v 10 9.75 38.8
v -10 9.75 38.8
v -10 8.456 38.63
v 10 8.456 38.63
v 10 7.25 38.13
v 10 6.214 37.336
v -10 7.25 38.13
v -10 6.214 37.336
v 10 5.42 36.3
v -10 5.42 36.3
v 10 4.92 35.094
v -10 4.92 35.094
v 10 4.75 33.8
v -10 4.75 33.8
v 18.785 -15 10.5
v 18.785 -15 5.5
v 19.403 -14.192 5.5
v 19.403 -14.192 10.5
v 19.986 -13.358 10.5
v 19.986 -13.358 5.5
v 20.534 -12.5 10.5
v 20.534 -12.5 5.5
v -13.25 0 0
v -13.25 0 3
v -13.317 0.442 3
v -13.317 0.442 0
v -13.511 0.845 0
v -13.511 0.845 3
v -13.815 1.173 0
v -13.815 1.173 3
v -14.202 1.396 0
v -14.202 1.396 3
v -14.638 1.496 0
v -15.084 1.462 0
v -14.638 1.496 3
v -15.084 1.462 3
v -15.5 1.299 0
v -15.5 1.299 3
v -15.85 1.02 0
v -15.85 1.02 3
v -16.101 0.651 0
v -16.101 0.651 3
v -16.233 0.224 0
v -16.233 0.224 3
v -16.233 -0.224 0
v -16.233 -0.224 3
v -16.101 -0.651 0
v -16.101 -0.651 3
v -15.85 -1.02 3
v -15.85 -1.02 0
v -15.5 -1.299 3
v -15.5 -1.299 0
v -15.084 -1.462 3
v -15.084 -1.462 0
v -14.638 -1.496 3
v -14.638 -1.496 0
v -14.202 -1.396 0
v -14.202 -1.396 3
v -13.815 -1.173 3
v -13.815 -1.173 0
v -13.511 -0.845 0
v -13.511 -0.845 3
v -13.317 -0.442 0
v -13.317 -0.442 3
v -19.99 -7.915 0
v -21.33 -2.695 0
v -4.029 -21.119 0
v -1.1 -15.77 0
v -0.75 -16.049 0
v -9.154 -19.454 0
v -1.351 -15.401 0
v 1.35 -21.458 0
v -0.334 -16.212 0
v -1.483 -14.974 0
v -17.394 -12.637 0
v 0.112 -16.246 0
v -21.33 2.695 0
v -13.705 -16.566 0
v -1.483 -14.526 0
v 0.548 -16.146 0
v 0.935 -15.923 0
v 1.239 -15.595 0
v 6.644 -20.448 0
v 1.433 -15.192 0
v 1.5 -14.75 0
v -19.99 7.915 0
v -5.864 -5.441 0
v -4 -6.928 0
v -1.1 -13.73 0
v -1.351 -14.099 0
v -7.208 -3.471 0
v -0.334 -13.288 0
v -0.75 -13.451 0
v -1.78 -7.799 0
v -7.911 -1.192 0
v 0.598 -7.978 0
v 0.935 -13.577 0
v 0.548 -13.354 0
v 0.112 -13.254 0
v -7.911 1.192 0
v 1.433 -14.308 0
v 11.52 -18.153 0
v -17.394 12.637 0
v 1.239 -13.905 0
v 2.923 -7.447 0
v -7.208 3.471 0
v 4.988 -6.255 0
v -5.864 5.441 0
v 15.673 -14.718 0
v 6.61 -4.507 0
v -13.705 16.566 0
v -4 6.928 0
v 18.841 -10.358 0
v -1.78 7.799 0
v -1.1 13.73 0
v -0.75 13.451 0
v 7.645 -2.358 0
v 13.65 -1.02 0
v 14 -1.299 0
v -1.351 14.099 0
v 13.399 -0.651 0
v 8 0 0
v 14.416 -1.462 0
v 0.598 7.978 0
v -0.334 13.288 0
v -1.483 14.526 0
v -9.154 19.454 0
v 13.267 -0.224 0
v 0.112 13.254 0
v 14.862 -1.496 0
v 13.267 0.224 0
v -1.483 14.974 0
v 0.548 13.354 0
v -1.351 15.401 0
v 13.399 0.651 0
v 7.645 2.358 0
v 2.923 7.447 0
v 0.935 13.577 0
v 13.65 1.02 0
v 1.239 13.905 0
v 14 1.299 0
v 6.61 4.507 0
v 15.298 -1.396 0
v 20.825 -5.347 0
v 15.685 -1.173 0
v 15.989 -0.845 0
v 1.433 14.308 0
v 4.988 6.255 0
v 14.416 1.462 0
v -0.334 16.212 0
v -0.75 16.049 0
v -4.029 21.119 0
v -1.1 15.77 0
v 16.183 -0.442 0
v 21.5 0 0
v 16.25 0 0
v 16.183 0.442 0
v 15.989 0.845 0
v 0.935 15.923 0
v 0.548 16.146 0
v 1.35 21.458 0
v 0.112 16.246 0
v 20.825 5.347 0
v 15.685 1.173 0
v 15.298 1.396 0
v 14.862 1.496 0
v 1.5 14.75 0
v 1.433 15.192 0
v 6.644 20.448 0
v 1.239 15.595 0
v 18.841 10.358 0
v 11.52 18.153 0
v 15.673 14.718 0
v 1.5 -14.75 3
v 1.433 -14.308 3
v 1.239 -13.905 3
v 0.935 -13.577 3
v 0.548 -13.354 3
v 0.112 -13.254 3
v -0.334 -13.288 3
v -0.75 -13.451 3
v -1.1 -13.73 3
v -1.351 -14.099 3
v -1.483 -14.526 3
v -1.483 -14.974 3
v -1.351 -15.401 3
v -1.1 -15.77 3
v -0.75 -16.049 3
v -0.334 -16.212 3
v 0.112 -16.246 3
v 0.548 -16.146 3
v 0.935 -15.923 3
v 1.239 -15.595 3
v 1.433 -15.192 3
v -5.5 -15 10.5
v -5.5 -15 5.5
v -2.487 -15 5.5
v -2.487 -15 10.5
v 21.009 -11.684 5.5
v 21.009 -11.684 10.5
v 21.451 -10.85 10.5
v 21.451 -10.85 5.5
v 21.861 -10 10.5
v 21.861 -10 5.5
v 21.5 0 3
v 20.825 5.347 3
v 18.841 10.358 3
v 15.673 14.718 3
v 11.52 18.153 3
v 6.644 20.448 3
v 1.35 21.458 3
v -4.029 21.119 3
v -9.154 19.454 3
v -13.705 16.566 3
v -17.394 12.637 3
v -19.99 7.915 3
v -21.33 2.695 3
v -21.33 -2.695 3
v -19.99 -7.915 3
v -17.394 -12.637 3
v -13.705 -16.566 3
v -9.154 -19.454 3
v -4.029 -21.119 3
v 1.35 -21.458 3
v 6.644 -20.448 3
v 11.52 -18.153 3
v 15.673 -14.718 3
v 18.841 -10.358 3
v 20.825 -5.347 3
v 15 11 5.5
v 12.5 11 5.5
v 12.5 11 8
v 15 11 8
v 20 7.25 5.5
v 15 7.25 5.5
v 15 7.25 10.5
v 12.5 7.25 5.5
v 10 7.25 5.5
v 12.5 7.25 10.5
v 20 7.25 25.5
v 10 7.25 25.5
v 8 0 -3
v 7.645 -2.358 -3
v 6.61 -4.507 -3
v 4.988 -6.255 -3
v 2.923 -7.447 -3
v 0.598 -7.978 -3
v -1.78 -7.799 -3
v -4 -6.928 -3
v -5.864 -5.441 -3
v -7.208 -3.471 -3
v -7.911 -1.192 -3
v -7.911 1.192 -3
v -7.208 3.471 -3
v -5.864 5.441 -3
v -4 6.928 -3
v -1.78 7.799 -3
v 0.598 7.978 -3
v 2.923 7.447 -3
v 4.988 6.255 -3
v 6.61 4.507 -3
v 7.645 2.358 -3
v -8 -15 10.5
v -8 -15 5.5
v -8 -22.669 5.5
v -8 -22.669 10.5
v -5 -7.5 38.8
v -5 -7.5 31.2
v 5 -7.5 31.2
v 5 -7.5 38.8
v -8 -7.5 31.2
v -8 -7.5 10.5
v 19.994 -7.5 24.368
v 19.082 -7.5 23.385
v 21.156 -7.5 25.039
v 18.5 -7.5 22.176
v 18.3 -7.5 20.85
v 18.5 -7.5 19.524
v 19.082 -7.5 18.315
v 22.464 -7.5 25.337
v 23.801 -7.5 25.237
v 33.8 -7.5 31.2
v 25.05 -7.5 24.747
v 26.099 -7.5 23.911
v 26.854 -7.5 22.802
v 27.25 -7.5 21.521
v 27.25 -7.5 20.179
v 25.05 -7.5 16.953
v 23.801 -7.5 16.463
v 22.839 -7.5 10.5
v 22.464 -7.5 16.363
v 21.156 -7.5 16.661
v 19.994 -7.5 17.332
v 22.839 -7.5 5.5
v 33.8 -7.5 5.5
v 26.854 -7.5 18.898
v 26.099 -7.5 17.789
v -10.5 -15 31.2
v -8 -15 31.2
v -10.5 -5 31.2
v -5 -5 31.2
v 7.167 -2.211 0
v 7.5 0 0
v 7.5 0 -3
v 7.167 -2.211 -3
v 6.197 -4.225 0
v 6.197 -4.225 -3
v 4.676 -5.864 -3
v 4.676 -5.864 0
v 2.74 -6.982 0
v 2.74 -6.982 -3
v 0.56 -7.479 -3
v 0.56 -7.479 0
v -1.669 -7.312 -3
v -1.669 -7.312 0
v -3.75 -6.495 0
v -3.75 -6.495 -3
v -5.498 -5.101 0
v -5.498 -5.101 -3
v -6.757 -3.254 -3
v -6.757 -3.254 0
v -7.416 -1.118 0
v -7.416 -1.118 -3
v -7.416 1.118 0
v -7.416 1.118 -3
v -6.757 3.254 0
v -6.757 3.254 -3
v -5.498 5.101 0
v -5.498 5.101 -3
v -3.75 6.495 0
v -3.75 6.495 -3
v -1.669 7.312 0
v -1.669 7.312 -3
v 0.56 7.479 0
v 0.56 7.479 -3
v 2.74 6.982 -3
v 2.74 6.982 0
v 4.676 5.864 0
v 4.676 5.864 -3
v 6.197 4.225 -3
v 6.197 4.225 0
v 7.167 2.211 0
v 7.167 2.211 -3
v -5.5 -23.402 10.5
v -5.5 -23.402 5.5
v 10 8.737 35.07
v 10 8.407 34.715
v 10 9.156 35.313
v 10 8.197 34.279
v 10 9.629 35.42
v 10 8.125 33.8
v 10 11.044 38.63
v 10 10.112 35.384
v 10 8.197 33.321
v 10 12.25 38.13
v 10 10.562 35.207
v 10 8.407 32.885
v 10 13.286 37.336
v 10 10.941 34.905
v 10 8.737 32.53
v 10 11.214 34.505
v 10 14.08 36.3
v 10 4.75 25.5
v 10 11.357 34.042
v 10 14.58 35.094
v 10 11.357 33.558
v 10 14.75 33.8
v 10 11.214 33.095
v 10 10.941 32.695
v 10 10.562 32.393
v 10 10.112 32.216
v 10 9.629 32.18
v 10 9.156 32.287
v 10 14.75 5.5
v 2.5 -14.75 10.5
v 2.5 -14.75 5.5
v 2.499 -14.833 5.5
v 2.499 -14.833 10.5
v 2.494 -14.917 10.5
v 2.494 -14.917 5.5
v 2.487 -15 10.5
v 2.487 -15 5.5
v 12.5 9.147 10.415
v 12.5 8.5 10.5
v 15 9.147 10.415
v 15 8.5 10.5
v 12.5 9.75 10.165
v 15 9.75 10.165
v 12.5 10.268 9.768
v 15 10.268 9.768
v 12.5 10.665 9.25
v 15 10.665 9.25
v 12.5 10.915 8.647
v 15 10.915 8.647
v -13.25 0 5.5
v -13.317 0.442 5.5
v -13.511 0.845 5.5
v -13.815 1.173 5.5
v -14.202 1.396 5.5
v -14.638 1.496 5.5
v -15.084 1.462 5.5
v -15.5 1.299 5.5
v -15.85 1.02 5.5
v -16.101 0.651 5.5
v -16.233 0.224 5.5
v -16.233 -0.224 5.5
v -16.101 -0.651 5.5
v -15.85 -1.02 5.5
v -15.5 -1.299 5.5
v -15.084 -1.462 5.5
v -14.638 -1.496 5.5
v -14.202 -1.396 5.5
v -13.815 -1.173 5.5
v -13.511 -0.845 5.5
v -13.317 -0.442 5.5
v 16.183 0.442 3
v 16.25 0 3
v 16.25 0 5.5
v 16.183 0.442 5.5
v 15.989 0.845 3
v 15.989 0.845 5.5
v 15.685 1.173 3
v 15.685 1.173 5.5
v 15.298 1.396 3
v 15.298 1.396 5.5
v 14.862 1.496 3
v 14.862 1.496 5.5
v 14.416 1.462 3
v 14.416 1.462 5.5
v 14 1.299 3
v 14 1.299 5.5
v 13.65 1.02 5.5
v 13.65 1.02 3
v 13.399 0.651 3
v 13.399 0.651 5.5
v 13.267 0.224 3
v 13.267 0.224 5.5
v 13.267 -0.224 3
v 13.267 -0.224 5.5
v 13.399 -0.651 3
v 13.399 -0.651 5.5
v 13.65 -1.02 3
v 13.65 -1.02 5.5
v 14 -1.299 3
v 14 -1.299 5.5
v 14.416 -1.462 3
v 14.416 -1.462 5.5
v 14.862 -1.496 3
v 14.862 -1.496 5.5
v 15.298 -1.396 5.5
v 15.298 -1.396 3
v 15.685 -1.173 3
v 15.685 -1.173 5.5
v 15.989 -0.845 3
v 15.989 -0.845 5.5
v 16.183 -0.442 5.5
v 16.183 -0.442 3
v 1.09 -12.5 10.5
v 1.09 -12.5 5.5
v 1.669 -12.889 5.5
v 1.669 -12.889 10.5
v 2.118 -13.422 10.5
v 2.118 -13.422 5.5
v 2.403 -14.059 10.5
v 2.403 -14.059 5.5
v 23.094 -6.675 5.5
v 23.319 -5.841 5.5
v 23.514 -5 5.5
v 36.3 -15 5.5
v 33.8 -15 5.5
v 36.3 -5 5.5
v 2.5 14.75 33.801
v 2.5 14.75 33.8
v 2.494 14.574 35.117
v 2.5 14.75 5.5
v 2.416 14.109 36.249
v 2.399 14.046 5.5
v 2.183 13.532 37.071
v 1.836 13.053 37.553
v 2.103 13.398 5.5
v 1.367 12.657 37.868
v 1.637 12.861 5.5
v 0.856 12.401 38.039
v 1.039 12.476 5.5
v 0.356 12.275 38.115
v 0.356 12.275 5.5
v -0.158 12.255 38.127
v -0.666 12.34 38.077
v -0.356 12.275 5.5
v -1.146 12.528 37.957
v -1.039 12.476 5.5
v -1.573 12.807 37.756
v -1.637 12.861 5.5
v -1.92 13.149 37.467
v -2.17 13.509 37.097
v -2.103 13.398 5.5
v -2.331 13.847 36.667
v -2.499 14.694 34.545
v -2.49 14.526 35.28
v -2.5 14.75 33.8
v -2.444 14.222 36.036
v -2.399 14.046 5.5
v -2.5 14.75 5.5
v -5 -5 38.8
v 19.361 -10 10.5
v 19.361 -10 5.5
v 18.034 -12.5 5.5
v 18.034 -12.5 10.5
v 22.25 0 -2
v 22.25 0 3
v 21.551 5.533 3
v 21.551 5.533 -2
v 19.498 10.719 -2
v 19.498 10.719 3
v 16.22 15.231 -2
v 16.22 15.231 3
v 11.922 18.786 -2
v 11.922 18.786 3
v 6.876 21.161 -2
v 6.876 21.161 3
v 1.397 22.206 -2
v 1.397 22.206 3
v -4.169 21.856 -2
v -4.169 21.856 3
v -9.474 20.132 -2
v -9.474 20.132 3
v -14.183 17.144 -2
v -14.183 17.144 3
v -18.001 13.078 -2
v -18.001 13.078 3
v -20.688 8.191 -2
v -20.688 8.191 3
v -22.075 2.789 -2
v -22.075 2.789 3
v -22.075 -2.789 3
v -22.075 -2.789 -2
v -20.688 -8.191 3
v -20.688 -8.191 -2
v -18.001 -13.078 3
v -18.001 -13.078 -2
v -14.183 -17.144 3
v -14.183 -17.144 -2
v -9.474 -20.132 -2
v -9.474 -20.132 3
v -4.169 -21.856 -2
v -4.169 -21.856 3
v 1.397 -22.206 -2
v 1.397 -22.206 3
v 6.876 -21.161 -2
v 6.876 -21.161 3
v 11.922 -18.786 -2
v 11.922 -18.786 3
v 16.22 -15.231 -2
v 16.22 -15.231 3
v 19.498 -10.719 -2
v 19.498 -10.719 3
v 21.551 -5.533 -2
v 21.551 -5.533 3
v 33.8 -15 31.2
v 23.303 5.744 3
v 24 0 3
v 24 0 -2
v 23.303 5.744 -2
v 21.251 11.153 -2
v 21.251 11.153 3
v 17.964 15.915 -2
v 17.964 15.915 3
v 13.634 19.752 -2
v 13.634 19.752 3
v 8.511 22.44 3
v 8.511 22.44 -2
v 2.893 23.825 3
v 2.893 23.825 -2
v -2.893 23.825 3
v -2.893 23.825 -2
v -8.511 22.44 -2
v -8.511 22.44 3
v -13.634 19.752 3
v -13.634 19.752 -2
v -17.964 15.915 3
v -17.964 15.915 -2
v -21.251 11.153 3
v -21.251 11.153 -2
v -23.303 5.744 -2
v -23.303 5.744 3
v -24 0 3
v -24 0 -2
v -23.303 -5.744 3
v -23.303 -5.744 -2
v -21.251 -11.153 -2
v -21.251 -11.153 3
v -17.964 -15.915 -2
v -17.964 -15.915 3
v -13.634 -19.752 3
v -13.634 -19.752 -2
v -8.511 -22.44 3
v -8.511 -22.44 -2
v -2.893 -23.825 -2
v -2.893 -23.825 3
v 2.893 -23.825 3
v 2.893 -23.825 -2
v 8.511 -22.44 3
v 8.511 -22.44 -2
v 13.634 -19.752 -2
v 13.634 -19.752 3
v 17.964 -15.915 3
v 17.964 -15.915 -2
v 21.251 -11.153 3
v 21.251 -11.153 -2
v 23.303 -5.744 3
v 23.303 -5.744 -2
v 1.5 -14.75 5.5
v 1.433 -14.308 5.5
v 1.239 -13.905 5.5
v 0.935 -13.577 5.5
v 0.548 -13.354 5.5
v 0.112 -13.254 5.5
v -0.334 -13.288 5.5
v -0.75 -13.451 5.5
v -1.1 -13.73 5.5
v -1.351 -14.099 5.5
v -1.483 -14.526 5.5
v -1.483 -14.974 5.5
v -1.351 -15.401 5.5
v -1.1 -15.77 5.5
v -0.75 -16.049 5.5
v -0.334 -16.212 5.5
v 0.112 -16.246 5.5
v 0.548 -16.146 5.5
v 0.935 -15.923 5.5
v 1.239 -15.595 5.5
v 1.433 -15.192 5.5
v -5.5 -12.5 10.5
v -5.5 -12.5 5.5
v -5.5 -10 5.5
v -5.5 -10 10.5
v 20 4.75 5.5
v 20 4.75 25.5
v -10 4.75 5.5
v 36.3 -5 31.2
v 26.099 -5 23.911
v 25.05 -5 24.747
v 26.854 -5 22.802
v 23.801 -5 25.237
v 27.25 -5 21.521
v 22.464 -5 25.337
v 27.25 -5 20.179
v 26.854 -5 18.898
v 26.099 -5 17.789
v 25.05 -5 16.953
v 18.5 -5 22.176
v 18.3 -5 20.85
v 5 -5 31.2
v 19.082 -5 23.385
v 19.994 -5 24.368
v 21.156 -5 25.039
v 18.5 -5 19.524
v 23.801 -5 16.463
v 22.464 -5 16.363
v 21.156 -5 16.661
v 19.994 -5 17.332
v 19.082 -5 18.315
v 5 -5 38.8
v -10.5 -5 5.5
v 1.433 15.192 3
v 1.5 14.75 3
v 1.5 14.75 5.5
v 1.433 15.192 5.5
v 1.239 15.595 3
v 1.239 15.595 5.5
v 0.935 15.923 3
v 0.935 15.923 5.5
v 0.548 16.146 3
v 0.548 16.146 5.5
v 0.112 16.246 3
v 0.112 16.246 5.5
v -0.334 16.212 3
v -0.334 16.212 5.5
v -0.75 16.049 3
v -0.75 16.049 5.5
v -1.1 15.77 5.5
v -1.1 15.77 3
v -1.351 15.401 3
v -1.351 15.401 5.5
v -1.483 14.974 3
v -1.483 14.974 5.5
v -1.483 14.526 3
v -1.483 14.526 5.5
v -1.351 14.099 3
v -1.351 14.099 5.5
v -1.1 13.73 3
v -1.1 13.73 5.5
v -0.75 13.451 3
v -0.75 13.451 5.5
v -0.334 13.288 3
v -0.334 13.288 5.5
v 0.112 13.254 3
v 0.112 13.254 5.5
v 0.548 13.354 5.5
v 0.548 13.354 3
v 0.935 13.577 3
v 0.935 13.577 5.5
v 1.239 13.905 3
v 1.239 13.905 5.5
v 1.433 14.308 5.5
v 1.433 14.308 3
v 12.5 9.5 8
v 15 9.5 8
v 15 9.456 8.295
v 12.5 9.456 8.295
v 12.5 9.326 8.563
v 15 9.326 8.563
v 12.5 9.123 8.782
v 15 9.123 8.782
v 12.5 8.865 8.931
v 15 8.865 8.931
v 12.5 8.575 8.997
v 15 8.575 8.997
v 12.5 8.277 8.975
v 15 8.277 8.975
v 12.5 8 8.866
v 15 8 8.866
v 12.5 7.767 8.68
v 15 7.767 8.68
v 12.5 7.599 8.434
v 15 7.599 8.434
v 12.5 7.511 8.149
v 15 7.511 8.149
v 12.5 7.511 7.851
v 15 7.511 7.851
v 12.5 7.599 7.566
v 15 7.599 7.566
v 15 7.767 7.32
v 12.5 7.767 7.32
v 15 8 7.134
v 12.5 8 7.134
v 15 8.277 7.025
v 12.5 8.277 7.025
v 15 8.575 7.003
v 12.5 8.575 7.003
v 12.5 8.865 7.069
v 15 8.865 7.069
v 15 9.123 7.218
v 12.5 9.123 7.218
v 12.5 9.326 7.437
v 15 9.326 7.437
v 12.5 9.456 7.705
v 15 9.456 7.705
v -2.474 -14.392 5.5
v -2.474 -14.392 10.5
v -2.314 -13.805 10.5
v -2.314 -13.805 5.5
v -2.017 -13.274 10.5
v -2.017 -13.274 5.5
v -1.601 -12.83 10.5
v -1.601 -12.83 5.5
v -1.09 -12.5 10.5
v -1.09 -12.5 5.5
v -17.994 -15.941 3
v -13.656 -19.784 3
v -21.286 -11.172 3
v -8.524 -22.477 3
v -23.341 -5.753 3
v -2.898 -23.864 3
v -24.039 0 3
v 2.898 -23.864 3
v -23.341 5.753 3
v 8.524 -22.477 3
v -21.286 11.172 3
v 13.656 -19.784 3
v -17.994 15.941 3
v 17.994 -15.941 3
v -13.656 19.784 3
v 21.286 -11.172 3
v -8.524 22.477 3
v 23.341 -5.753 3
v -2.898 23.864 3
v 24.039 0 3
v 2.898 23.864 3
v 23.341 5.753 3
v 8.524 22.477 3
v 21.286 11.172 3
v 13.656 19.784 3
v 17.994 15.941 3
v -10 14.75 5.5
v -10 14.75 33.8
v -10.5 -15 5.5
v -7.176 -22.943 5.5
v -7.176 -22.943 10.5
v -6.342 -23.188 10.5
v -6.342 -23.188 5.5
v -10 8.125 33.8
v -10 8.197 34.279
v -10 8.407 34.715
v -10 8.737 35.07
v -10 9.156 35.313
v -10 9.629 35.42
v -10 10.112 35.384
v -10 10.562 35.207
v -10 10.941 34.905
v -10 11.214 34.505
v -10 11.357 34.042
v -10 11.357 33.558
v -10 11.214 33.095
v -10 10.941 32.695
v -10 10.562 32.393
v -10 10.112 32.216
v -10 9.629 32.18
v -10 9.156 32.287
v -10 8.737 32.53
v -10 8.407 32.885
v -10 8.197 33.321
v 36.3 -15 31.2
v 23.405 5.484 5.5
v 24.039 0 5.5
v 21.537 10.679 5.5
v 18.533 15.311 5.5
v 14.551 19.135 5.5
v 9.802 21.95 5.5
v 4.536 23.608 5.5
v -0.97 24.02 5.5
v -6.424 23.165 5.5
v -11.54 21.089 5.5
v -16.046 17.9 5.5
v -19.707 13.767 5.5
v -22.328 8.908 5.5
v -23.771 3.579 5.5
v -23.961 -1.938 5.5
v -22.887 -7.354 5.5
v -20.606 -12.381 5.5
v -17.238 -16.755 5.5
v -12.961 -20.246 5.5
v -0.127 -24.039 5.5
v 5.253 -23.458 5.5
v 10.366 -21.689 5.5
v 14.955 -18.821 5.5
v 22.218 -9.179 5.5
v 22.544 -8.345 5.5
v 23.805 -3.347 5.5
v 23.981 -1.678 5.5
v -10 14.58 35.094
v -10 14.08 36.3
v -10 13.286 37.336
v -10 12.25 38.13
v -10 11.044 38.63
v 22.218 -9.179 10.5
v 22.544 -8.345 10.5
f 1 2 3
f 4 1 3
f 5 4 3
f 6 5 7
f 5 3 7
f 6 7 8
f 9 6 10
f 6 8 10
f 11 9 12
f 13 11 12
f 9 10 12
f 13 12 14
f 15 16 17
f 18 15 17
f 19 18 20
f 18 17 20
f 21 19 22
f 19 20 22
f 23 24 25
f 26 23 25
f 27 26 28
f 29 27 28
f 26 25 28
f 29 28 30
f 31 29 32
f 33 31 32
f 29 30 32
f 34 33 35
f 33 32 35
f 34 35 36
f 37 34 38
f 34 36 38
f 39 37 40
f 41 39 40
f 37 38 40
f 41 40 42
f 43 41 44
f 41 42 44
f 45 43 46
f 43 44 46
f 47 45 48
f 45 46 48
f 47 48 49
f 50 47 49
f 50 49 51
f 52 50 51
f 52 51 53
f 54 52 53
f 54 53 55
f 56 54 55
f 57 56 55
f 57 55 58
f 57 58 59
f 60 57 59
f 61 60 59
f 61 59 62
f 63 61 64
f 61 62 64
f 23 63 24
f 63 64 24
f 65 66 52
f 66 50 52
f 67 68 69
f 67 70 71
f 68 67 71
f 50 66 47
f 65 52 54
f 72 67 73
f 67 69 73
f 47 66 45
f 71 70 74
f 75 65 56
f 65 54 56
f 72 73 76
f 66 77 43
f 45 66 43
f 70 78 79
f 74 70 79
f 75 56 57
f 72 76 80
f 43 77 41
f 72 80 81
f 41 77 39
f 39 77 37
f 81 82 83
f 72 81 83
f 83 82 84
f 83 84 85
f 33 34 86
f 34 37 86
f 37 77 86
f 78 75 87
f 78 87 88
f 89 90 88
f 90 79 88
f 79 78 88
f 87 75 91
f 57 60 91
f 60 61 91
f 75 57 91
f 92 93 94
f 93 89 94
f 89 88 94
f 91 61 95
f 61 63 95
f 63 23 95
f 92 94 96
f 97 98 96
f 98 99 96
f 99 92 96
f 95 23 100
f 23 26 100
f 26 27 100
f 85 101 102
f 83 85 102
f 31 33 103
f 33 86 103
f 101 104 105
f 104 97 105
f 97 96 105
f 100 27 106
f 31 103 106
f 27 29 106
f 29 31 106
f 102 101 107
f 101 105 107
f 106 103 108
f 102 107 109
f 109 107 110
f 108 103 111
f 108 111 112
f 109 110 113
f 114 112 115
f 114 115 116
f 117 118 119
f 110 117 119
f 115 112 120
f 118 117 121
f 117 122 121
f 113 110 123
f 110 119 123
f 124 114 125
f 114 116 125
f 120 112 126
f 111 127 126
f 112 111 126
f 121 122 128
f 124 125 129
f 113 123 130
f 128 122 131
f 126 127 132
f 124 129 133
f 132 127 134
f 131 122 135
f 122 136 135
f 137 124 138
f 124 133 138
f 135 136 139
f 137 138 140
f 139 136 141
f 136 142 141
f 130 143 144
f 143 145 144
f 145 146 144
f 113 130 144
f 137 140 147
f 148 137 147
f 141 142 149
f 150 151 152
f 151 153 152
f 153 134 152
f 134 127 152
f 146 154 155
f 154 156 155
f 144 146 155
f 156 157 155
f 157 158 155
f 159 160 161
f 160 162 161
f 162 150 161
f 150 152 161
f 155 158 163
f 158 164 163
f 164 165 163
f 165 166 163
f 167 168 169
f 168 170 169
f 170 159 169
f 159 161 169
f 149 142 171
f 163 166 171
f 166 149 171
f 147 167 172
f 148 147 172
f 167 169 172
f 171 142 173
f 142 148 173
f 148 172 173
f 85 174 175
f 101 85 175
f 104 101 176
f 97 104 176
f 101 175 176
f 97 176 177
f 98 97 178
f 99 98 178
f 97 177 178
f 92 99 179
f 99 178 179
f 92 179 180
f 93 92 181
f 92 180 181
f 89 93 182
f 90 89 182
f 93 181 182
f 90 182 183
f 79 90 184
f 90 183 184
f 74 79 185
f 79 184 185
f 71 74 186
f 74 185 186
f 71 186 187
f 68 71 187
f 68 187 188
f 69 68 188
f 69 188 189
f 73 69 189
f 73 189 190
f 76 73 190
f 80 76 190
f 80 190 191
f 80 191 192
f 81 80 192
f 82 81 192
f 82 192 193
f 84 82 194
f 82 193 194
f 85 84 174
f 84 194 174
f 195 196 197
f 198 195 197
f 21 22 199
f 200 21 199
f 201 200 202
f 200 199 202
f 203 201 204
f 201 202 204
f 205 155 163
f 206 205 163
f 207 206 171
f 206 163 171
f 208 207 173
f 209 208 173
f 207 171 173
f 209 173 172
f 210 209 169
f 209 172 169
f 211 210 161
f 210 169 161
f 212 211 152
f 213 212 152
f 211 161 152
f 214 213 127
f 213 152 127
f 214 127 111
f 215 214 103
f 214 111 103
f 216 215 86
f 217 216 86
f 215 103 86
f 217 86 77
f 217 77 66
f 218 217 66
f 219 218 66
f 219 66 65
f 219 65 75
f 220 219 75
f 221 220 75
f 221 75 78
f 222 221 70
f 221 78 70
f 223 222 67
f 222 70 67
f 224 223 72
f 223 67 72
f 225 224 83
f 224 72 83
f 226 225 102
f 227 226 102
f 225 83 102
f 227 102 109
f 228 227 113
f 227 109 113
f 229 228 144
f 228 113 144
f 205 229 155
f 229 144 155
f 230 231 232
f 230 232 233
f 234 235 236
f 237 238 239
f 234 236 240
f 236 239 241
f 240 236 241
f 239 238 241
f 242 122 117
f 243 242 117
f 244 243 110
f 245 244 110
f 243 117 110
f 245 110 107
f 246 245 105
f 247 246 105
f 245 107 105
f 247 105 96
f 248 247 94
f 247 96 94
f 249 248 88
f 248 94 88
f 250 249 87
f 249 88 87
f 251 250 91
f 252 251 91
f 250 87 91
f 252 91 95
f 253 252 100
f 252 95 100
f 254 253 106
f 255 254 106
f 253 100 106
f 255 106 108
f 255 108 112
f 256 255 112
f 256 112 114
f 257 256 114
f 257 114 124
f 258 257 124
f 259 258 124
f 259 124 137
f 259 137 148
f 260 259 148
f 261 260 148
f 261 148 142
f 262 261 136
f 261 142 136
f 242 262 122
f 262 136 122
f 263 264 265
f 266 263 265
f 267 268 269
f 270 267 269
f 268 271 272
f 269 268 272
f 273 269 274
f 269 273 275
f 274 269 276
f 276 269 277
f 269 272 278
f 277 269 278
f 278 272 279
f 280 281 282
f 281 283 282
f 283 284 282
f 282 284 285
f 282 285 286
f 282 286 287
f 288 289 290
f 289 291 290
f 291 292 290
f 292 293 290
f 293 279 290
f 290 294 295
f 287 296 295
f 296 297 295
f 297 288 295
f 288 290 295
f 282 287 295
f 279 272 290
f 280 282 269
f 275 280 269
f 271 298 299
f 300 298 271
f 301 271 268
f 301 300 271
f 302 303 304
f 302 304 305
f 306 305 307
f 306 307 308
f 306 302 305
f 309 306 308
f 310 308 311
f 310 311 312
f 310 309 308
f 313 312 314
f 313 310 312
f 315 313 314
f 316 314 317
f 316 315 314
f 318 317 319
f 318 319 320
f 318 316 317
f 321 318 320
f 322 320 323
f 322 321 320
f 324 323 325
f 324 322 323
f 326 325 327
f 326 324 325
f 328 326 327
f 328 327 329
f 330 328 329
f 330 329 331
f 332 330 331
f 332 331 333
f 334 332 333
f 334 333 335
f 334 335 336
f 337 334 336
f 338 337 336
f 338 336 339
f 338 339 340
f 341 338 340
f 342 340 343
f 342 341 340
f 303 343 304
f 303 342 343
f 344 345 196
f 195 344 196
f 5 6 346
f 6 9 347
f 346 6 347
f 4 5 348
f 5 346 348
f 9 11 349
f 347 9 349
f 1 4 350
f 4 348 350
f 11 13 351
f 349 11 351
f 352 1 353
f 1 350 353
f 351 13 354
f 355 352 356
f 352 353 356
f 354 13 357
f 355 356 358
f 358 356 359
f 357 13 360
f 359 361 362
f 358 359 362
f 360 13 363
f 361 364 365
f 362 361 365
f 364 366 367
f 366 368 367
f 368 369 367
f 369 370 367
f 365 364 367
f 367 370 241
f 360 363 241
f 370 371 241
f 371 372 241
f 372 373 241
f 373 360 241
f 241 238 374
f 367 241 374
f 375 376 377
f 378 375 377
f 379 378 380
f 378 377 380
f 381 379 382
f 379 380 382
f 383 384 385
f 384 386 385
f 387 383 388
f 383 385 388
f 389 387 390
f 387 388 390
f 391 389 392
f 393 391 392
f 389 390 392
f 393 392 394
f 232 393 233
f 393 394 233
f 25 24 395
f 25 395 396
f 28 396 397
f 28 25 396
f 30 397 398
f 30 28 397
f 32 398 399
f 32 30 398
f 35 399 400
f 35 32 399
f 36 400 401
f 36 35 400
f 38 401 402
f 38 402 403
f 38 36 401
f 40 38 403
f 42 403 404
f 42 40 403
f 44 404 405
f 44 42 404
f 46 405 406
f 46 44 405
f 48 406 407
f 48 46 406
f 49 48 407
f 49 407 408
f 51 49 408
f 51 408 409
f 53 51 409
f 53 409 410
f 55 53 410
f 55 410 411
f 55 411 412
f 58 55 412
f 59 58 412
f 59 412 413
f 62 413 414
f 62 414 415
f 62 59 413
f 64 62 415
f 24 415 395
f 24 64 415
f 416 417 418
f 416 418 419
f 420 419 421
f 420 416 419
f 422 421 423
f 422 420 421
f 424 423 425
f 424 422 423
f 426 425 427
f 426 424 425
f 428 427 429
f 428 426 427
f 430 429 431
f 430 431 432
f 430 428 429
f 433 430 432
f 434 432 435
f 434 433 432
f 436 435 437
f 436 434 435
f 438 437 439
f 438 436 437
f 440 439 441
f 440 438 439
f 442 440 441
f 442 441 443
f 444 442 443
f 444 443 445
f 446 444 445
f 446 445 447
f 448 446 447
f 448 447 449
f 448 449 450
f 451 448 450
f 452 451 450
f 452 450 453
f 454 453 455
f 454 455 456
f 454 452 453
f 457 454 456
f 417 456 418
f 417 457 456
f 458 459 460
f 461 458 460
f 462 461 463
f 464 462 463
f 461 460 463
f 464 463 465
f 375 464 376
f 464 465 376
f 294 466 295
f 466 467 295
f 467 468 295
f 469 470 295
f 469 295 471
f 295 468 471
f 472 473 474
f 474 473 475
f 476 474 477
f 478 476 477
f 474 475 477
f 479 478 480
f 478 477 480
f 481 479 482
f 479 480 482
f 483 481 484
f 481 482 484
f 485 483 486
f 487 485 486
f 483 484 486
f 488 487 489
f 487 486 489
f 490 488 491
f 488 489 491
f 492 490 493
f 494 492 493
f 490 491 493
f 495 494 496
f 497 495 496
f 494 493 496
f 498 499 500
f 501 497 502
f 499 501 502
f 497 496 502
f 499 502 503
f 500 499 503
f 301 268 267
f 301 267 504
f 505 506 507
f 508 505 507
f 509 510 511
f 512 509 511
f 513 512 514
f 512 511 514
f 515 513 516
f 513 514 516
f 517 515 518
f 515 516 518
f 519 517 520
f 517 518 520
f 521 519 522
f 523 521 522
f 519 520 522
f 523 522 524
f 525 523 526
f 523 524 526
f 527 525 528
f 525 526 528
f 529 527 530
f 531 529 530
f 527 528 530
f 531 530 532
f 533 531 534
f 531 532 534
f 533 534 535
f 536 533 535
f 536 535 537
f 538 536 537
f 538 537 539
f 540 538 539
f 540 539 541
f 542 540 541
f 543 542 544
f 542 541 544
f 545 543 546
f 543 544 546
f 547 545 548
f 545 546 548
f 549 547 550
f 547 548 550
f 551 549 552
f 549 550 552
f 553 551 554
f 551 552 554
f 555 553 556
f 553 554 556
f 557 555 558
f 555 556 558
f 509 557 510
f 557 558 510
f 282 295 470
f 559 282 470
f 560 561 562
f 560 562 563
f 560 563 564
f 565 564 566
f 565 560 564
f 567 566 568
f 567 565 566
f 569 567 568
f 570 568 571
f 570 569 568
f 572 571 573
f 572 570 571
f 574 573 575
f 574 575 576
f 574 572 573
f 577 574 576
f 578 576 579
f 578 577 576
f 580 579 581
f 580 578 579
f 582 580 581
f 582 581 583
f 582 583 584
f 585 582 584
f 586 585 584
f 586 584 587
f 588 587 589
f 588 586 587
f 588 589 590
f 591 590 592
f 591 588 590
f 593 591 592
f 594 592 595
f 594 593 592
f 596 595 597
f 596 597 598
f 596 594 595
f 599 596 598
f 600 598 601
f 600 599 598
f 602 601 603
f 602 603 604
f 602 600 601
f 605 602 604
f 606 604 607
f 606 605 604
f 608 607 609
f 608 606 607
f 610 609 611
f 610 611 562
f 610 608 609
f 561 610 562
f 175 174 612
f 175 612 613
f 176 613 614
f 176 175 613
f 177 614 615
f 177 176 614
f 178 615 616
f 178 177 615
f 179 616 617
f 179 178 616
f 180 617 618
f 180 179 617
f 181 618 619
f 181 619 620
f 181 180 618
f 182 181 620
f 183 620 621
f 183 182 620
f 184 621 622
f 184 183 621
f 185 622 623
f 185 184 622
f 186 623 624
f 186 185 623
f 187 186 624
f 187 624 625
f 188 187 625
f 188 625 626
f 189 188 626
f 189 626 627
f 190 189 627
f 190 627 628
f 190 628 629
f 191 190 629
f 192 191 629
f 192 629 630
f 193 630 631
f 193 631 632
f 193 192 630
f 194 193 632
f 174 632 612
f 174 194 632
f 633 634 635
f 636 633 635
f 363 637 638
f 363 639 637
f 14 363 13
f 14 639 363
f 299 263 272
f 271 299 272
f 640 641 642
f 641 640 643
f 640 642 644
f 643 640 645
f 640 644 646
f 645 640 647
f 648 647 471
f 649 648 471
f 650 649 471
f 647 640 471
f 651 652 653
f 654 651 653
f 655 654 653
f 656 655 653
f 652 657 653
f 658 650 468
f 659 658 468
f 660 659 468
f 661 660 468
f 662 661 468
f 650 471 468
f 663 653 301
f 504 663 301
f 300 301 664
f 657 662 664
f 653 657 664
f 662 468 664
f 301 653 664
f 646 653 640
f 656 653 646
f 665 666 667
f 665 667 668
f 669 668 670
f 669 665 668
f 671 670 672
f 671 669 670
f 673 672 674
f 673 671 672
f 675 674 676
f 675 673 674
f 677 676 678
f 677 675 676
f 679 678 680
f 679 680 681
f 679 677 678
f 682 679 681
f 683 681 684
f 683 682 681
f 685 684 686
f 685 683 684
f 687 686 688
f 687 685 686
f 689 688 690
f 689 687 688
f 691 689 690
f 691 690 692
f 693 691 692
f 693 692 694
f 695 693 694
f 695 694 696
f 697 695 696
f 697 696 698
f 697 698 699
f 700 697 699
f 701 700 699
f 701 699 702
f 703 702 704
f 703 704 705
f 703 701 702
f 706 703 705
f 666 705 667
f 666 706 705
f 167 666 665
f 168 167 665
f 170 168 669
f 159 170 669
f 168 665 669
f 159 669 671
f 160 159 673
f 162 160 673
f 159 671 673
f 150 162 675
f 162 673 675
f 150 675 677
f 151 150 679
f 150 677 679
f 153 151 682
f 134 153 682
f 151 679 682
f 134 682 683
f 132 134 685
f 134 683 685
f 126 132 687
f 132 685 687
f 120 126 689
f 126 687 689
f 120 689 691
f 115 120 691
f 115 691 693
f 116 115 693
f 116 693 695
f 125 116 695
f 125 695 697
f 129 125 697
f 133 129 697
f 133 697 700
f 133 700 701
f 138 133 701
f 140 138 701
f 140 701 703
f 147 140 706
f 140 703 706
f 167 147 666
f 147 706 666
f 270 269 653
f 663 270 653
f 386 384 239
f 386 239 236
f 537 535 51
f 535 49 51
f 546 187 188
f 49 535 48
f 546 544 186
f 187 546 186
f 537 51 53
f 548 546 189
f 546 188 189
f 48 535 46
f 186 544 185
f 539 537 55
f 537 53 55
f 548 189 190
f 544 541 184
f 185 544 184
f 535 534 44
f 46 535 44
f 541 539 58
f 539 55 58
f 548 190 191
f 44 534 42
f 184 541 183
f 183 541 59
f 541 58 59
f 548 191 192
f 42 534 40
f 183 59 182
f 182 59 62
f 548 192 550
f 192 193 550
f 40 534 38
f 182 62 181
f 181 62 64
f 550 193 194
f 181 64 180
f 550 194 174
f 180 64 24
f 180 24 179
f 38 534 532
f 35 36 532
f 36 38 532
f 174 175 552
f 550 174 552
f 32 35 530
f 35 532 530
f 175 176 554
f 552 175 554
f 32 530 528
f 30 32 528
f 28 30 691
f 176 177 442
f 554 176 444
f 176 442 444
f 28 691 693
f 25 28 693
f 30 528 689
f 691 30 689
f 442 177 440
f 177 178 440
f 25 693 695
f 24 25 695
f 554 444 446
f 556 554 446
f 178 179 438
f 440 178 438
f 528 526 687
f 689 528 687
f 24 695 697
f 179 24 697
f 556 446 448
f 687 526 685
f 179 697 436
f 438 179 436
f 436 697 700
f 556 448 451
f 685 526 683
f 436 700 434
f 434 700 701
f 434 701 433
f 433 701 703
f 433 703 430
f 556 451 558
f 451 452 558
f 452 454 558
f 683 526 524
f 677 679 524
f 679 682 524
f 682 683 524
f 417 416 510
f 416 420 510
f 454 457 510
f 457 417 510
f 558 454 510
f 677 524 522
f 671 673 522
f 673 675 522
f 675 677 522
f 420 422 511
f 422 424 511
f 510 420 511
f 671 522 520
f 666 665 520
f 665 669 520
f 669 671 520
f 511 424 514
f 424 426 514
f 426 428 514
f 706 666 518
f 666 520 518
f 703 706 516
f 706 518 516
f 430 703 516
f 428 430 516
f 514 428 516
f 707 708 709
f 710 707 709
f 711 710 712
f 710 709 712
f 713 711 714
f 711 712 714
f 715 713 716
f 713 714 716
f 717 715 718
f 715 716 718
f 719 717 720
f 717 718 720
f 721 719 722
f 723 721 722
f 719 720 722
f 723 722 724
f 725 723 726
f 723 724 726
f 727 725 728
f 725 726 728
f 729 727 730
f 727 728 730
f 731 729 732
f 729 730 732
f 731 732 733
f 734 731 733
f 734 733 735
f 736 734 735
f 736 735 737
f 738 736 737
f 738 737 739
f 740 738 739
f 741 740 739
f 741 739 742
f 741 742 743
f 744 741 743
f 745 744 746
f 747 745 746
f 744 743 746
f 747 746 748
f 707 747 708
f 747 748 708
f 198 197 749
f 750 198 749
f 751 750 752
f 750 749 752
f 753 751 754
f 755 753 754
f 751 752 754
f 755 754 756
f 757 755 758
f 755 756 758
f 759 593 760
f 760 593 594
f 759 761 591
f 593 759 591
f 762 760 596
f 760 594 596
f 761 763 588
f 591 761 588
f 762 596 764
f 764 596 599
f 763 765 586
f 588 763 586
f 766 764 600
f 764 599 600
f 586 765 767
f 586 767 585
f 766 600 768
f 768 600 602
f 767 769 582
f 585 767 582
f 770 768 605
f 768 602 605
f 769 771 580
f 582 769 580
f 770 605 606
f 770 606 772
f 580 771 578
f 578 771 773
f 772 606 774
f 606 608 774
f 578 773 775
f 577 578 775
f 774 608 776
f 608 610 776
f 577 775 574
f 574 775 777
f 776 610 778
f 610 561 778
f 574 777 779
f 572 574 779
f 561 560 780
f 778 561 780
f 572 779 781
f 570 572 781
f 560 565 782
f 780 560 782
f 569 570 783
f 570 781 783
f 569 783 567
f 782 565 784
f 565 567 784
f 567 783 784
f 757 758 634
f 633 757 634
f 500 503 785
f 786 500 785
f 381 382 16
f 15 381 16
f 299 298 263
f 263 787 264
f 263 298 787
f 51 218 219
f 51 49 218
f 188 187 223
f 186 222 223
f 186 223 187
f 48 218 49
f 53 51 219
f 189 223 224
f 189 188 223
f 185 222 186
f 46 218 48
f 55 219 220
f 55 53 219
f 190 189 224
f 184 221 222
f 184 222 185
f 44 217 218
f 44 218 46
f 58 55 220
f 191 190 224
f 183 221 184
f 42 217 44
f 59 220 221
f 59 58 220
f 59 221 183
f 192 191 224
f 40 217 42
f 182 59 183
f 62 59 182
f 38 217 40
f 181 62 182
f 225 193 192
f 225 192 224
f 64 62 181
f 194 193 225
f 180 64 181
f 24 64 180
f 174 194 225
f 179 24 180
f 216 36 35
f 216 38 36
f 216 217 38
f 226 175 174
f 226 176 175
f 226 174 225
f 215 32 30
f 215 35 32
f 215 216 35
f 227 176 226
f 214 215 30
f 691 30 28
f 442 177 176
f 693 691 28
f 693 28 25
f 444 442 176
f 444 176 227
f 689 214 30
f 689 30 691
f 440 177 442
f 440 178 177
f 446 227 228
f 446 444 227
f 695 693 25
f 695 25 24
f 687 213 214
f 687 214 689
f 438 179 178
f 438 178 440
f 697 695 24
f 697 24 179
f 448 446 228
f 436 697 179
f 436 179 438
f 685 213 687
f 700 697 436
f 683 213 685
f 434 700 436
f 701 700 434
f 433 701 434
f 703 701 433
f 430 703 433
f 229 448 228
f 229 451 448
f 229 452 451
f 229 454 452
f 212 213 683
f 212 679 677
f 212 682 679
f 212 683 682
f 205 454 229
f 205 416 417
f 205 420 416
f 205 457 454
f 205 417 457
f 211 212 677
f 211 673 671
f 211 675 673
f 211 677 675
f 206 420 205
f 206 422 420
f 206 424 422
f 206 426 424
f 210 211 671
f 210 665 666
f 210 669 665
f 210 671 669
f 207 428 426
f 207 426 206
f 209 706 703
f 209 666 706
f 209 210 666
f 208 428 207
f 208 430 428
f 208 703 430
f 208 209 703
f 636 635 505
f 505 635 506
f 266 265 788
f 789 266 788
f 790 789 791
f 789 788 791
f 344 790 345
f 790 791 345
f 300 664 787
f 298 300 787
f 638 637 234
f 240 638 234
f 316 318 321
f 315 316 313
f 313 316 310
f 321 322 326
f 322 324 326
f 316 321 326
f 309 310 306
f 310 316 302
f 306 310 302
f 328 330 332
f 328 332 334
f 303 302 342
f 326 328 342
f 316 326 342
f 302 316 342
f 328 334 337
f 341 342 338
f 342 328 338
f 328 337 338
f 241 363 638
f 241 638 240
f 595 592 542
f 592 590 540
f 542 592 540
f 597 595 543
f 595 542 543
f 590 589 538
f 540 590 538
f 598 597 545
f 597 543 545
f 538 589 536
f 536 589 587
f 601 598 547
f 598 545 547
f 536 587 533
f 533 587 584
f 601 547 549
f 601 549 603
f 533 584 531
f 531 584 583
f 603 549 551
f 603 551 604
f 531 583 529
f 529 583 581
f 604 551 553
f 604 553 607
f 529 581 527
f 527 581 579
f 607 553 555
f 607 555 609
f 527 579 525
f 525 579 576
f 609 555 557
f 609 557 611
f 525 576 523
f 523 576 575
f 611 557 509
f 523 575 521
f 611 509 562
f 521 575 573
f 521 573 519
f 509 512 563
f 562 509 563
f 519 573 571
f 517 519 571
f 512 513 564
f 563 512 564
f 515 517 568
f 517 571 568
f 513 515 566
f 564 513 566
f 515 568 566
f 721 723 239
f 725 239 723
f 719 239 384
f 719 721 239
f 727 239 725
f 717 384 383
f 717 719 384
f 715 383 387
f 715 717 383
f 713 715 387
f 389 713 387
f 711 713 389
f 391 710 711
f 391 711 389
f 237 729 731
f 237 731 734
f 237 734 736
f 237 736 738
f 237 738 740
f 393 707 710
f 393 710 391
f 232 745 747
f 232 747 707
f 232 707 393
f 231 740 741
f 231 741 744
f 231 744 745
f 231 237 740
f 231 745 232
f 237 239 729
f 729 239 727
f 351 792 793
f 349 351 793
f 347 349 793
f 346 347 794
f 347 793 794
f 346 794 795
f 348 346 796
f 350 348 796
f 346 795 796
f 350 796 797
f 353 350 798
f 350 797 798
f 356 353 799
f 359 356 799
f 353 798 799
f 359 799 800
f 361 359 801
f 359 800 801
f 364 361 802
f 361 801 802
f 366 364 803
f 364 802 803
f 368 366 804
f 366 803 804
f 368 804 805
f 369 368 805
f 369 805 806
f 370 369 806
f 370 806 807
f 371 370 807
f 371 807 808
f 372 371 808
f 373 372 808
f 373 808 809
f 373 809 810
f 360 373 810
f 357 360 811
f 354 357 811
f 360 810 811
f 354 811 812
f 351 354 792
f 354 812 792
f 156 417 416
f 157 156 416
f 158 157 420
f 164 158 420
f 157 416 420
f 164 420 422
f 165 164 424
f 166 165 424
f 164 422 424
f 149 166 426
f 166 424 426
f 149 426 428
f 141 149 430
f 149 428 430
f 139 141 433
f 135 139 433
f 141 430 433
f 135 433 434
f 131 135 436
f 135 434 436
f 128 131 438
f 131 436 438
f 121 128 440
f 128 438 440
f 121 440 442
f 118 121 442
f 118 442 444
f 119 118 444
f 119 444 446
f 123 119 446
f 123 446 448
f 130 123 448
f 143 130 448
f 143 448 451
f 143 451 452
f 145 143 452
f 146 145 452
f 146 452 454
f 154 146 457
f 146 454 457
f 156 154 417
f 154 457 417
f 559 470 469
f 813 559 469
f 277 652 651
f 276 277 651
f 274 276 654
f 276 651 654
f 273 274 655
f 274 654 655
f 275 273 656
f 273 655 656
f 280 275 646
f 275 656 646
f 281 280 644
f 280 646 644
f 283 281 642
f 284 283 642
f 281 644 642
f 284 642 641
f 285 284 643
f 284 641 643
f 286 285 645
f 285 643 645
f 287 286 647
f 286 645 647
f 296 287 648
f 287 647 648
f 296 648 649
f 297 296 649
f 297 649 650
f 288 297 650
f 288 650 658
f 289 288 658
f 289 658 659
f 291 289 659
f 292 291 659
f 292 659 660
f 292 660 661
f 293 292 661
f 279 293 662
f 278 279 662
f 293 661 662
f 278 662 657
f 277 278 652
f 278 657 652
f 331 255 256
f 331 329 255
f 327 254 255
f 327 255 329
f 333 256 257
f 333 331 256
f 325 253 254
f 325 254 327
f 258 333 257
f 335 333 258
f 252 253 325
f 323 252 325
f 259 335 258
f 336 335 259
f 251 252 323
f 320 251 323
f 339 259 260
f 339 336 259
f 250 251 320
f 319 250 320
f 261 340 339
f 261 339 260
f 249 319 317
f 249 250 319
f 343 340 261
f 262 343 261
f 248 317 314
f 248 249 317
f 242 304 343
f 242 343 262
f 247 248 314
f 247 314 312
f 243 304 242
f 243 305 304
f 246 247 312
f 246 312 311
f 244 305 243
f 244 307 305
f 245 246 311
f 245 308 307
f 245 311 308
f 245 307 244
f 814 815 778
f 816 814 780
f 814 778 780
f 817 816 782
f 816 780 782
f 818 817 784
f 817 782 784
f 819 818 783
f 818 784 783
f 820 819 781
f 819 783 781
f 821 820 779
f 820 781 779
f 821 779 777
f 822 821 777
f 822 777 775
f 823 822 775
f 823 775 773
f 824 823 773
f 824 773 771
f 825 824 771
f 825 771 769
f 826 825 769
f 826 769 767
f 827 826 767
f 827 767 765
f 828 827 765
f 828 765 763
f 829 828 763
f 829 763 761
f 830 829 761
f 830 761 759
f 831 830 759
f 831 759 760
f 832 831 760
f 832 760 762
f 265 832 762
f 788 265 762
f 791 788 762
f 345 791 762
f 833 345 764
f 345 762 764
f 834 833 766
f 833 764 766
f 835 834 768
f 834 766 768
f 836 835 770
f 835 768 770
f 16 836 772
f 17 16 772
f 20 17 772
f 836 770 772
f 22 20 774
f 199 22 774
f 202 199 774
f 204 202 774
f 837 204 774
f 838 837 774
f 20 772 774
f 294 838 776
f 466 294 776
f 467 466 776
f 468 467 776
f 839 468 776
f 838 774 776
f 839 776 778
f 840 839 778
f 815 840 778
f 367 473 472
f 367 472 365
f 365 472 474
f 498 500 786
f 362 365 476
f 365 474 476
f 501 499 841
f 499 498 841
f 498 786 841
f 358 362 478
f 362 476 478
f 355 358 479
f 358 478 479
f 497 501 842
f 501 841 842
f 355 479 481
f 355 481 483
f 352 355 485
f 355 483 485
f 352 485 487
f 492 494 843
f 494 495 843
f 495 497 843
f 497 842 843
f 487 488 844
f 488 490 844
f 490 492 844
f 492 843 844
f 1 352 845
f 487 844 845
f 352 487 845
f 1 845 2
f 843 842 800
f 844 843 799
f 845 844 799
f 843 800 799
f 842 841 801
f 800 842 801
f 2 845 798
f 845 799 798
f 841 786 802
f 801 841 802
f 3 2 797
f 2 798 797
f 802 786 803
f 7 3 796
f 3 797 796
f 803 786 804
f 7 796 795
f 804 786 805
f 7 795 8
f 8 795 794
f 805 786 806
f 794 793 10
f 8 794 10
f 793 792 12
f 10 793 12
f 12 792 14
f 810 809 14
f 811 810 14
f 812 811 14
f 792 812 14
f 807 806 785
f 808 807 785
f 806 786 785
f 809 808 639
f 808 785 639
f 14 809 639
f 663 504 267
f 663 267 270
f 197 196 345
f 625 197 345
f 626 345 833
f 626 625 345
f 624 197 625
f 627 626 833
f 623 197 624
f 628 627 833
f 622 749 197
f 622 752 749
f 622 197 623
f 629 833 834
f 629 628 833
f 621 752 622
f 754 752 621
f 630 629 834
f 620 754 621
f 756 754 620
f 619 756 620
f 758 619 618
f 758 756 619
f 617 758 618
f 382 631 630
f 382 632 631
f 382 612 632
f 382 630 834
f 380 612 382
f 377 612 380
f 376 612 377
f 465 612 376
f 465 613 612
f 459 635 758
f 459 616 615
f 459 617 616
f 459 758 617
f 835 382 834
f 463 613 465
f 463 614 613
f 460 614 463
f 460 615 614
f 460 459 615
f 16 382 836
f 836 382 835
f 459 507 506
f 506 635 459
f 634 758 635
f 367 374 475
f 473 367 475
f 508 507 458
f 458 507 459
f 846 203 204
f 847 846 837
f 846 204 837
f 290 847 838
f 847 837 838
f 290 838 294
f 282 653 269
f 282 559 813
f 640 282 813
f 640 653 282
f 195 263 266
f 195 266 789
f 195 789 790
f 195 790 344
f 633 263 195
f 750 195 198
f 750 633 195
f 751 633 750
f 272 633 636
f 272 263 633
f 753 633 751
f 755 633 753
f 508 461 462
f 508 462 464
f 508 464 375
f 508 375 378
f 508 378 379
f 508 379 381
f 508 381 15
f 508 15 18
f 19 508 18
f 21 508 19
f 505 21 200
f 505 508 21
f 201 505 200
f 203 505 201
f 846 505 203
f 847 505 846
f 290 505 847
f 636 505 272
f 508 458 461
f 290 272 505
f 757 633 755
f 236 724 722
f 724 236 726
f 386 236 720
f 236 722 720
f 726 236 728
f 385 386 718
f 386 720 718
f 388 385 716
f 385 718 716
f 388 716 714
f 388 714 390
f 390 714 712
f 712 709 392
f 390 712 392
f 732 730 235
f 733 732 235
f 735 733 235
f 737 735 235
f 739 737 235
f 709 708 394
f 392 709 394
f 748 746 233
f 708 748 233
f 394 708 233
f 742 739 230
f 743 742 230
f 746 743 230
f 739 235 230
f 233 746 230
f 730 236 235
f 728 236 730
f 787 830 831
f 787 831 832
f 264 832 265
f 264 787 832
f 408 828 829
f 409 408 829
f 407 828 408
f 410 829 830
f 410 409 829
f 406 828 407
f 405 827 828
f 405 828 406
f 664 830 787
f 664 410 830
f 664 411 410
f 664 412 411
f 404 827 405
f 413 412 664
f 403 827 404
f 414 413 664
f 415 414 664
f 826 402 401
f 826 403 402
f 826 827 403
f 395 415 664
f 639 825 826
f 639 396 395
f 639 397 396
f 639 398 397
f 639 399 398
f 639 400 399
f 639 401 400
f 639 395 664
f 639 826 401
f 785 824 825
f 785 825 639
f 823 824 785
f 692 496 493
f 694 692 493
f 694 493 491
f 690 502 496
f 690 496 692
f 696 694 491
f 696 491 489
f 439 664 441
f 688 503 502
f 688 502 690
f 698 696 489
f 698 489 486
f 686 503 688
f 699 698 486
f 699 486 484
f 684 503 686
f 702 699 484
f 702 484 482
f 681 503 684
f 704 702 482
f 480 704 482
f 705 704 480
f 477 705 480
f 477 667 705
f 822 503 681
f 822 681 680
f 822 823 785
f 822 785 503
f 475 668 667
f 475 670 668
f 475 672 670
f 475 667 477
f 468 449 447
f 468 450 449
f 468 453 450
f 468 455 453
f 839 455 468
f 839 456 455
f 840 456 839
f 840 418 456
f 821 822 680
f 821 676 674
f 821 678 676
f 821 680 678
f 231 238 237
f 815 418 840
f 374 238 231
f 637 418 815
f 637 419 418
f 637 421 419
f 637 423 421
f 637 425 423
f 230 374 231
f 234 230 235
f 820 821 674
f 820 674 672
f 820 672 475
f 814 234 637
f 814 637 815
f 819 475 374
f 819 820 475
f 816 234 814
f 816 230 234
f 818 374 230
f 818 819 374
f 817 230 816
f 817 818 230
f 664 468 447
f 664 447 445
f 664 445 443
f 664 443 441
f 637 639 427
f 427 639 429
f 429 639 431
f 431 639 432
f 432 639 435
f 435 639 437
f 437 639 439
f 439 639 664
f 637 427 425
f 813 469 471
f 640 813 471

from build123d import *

# Parameters (mm, degrees)
F0_R      = 21.5
F1_DEPTH  = 3
F2_R      = 1.5
F3_DEPTH  = 3
F4_R      = 24
F4_R_2    = 22.25
F5_DEPTH  = 5
F7_R      = 8
F7_R_2    = 7.5
F8_DEPTH  = 3
F6_R      = 24.0393352326
F6_R_2    = 1.5
F9_DEPTH  = 2.5
F10_W     = 41.8
F10_H     = 2.5
F11_DEPTH = 25.7
F12_R     = 4.5
F13_DEPTH = 2.5
F14_W     = 2.5
F14_H     = 2.5
F15_DEPTH = 5
F17_DEPTH = 33.3
F18_R     = 1.625
F19_DEPTH = 20
F20_W     = 10
F20_H     = 2.5
F21_DEPTH = 7.6
F22_W     = 2.5
F22_H     = 5
F23_DEPTH = 5
F24_R     = 1
F25_DEPTH = 2.5
F26_W     = 2.5
F26_H     = 20
F27_DEPTH = 10
F28_R     = 2.5


with BuildPart() as f1:
    # F0 (on Top) → F1 (new body)
    with BuildSketch(Plane.XY):
        Circle(F0_R)
    extrude(amount=F1_DEPTH)

    # F2 (on face) → F3 (cut, through all)
    with BuildSketch(Plane.XY.offset(3)):
        with Locations((0, 14.75)):
            Circle(F2_R)
        with Locations((-14.75, 0)):
            Circle(F2_R)
        with Locations((14.75, 0)):
            Circle(F2_R)
        with Locations((0, -14.75)):
            Circle(F2_R)
    extrude(amount=-F3_DEPTH, mode=Mode.SUBTRACT)

    # F7 (on face) → F8 (join)
    with BuildSketch(Plane(origin=(0, 0, 0), x_dir=(1, 0, 0), z_dir=(0, 0, -1))):
        Circle(F7_R)
        Circle(F7_R_2, mode=Mode.SUBTRACT)
    extrude(amount=F8_DEPTH)


with BuildPart() as f5:
    # F4 (on face) → F5 (new body)
    with BuildSketch(Plane.XY.offset(3)):
        Circle(F4_R)
        Circle(F4_R_2, mode=Mode.SUBTRACT)
    extrude(amount=-F5_DEPTH)

    # F6 (on face) → F9 (join)
    with BuildSketch(Plane.XY.offset(3)):
        Circle(F6_R)
        with Locations((0, -14.75)):
            Circle(F6_R_2, mode=Mode.SUBTRACT)
        with Locations((-14.75, 0)):
            Circle(F6_R_2, mode=Mode.SUBTRACT)
        with Locations((14.75, 0)):
            Circle(F6_R_2, mode=Mode.SUBTRACT)
        with Locations((0, 14.75)):
            Circle(F6_R_2, mode=Mode.SUBTRACT)
    extrude(amount=F9_DEPTH)

    # F10 (on face) → F11 (join)
    with BuildSketch(Plane.XY.offset(5.5)):
        with Locations((12.9, -6.25)):
            Rectangle(F10_W, F10_H)
        Polygon((-8, -7.5), (-8, -5), (-10.5, -5), (-10.5, -15), (-8, -15), align=None)
        Polygon((36.3, -5), (33.8, -5), (33.8, -7.5), (33.8, -15), (36.3, -15), align=None)
    extrude(amount=F11_DEPTH)

    # F12 (on face) → F13 (cut, through all)
    with BuildSketch(Plane(origin=(0, -5, 0), x_dir=(-1, 0, 0), z_dir=(0, 1, 0))):
        with Locations((-22.8, 20.85)):
            Circle(F12_R)
    extrude(amount=-F13_DEPTH, mode=Mode.SUBTRACT)

    # F14 (on face) → F15 (join)
    with BuildSketch(Plane.XY.offset(5.5)):
        with Locations((-6.75, -13.75)):
            Rectangle(F14_W, F14_H)
        Polygon((-8, -7.5), (-8, -12.5), (-5.5, -12.5), (-5.5, -10), (-5.5, -7.5), align=None)
        with BuildLine():
            Line((-5.5, -7.5), (-5.5, -10))
            Line((-5.5, -10), (19.3606870529, -10))
            Line((19.3606870529, -10), (21.8606870529, -10))
            ThreePointArc((21.8606870529, -10), (22.3849872275, -8.7636741867), (22.8394316573, -7.5))
            Line((22.8394316573, -7.5), (-5.5, -7.5))
        make_face()
        with BuildLine():
            Line((21.8606870529, -10), (19.3606870529, -10))
            Line((19.3606870529, -10), (18.0338656474, -12.5))
            Line((18.0338656474, -12.5), (20.5338656474, -12.5))
            ThreePointArc((20.5338656474, -12.5), (21.2341005146, -11.2695436359), (21.8606870529, -10))
        make_face()
        with BuildLine():
            ThreePointArc((2.5, -14.75), (2.4968651828, -14.8751569376), (2.4874685928, -15))
            Line((2.4874685928, -15), (18.7853570215, -15))
            ThreePointArc((18.7853570215, -15), (19.699310085, -13.7777654431), (20.5338656474, -12.5))
            Line((20.5338656474, -12.5), (18.0338656474, -12.5))
            Line((18.0338656474, -12.5), (1.0897247359, -12.5))
            ThreePointArc((1.0897247359, -12.5), (2.1182908015, -13.4222786135), (2.5, -14.75))
        make_face()
        with BuildLine():
            Line((-5.5, -15), (-8, -15))
            Line((-8, -15), (-8, -22.6691340467))
            ThreePointArc((-8, -22.6691340467), (-6.7599307548, -23.0693080654), (-5.5, -23.4017016139))
            Line((-5.5, -23.4017016139), (-5.5, -15))
        make_face()
        with BuildLine():
            Line((-5.5, -12.5), (-5.5, -15))
            Line((-5.5, -15), (-2.4874685928, -15))
            ThreePointArc((-2.4874685928, -15), (-2.1821040369, -13.529990995), (-1.0897247359, -12.5))
            Line((-1.0897247359, -12.5), (-5.5, -12.5))
        make_face()
    extrude(amount=F15_DEPTH)

    # F16 (on face) → F17 (join)
    with BuildSketch(Plane.XY.offset(5.5)):
        with BuildLine():
            Line((-10, 14.75), (-10, 4.75))
            Line((-10, 4.75), (10, 4.75))
            Line((10, 4.75), (10, 14.75))
            Line((10, 14.75), (2.5, 14.75))
            ThreePointArc((2.5, 14.75), (0, 12.25), (-2.5, 14.75))
            Line((-2.5, 14.75), (-10, 14.75))
        make_face()
    extrude(amount=F17_DEPTH)

    # F18 (on face) → F19 (cut, through all)
    with BuildSketch(Plane(origin=(-10, 0, 0), x_dir=(0, -1, 0), z_dir=(-1, 0, 0))):
        with Locations((-9.75, 33.8)):
            Circle(F18_R)
        with BuildLine():
            ThreePointArc((-14.75, 33.8), (-13.2855339059, 37.3355339059), (-9.75, 38.8))
            Line((-9.75, 38.8), (-14.75, 38.8))
            Line((-14.75, 38.8), (-14.75, 33.8))
        make_face()
        with BuildLine():
            ThreePointArc((-9.75, 38.8), (-6.2144660941, 37.3355339059), (-4.75, 33.8))
            Line((-4.75, 33.8), (-4.75, 38.8))
            Line((-4.75, 38.8), (-9.75, 38.8))
        make_face()
    extrude(amount=-F19_DEPTH, mode=Mode.SUBTRACT)

    # F20 (on face) → F21 (join)
    with BuildSketch(Plane.XY.offset(31.2)):
        with Locations((0, -6.25)):
            Rectangle(F20_W, F20_H)
    extrude(amount=F21_DEPTH)

    # F22 (on face) → F23 (join)
    with BuildSketch(Plane.XY.offset(5.5)):
        with Locations((13.75, 8.5)):
            Rectangle(F22_W, F22_H)
    extrude(amount=F23_DEPTH)

    # F24 (on face) → F25 (cut, through all)
    with BuildSketch(Plane.YZ.offset(15)):
        with Locations((8.5, 8)):
            Circle(F24_R)
    extrude(amount=-F25_DEPTH, mode=Mode.SUBTRACT)

    # F26 (on face) → F27 (join)
    with BuildSketch(Plane.YZ.offset(10)):
        with Locations((6, 15.5)):
            Rectangle(F26_W, F26_H)
    extrude(amount=F27_DEPTH)

    # F28
    f28_edges = [f5.edges().sort_by_distance(p)[0] for p in [
        (13.75, 11, 10.5),
    ]]
    fillet(f28_edges, radius=F28_R)


solid = Compound([f1.part, f5.part])
